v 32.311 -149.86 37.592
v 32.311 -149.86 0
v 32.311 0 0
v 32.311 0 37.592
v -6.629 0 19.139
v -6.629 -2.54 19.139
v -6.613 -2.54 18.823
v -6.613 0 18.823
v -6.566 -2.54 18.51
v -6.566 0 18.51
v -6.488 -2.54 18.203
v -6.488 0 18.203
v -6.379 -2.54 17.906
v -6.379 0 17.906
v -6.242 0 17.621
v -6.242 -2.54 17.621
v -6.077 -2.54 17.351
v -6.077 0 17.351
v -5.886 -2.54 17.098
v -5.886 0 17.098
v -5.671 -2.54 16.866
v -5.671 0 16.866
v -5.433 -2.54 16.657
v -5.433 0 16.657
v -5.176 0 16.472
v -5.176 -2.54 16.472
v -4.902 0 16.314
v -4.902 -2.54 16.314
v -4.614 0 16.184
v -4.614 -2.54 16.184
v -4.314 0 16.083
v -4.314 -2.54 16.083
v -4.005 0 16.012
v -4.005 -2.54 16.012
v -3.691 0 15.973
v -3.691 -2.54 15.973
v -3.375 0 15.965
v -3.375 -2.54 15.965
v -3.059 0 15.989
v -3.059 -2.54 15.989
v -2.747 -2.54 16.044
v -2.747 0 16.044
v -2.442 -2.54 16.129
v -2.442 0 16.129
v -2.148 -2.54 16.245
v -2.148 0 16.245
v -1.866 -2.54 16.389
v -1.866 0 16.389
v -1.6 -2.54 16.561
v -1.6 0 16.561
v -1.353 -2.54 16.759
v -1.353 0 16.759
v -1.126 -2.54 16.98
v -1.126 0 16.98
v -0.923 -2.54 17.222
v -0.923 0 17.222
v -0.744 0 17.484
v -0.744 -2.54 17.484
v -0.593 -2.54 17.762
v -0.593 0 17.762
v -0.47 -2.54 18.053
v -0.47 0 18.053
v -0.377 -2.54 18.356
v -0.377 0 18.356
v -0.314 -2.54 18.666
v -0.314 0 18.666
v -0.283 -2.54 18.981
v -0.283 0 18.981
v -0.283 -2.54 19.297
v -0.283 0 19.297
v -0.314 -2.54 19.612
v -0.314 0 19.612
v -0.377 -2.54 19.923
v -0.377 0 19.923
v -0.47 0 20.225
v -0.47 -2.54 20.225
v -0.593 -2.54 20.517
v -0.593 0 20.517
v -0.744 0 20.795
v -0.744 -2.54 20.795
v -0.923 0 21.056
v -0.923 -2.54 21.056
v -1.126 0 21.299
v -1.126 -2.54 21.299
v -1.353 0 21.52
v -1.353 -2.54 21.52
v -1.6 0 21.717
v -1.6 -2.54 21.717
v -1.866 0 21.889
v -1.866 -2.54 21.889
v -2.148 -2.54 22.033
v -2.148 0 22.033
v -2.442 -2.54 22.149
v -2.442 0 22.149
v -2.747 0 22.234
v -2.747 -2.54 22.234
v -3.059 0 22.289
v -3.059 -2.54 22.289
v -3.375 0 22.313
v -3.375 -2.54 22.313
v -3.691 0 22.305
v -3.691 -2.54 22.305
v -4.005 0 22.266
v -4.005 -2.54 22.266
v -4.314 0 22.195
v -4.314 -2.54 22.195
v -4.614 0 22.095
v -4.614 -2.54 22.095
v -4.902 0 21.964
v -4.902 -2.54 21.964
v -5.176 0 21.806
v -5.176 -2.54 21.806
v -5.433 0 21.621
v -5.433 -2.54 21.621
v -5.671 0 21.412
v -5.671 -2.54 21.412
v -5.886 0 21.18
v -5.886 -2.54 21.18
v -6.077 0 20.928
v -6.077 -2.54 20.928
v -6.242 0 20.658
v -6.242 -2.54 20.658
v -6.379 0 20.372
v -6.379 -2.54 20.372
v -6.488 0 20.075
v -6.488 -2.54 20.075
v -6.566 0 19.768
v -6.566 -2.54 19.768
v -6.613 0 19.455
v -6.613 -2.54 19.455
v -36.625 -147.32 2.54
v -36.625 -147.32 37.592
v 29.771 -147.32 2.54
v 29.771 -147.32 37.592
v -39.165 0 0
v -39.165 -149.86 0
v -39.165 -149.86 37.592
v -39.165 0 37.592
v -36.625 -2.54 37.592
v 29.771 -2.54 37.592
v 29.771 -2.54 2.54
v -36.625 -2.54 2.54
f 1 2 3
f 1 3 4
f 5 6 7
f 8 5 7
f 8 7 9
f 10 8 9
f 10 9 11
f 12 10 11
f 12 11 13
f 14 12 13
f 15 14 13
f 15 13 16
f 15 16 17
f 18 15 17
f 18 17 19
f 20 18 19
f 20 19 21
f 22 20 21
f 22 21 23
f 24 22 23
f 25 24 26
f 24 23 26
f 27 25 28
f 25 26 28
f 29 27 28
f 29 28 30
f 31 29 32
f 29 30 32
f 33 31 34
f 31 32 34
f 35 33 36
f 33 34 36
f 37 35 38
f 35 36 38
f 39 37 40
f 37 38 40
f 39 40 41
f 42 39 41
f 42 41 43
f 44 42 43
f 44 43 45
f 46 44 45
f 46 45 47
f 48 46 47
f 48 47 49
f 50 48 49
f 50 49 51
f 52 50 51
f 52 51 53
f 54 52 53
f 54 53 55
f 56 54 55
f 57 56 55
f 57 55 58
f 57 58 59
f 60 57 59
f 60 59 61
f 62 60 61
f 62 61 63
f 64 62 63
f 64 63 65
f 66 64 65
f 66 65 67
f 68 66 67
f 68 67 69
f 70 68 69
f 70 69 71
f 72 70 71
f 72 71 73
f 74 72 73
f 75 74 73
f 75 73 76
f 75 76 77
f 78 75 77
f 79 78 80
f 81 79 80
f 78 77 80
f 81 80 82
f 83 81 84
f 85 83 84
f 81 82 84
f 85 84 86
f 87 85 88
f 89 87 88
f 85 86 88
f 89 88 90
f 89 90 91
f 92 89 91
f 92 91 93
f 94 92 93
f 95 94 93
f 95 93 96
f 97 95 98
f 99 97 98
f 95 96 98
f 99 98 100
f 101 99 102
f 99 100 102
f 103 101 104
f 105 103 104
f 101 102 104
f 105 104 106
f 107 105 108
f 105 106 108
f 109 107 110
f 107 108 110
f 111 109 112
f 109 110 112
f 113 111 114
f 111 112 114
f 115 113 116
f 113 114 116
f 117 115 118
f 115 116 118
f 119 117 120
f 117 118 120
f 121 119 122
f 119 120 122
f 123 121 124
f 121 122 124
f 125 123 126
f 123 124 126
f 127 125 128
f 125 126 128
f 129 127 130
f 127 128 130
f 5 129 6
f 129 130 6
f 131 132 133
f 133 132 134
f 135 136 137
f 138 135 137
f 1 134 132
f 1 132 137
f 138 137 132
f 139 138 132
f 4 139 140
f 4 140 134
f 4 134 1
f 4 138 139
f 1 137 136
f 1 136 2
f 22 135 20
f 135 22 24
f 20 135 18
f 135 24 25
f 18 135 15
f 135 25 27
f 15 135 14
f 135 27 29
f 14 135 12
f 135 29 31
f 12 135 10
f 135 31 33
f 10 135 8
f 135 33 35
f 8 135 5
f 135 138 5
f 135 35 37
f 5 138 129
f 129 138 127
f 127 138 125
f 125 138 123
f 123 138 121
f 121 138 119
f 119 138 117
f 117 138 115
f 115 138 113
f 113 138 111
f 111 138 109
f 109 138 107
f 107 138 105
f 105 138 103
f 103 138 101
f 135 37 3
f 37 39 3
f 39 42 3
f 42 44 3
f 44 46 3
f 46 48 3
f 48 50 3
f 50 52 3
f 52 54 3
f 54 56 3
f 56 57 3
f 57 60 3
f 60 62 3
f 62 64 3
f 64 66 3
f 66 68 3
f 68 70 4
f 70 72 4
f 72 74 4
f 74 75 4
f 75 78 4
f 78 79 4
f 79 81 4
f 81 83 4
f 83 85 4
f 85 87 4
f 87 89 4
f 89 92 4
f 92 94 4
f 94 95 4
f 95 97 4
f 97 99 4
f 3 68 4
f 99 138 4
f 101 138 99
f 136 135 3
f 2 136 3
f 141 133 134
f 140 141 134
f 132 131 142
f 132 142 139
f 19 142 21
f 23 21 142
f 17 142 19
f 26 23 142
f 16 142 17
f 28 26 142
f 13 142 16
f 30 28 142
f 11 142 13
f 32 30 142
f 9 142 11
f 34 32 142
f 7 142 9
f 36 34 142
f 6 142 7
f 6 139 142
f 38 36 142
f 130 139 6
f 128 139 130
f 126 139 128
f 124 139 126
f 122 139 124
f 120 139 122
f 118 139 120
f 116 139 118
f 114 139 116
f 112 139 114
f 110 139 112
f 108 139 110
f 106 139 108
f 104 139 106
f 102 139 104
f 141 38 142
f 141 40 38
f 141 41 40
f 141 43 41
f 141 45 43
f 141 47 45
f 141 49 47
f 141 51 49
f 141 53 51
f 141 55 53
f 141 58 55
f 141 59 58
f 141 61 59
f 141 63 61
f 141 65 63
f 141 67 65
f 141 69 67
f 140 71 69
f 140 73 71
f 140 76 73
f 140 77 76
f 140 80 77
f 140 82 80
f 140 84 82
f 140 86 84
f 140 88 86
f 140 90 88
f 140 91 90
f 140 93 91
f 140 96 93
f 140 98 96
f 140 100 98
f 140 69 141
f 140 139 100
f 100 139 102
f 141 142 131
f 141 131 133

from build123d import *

# Parameters (mm, degrees)
F0_W     = 71.4756
F0_H     = 37.592
F1_DEPTH = 149.86
F2_T     = -2.54
F4_D     = 6.35
F4_DEPTH = 25.4
F4_TIP   = 1.9077324654


with BuildPart() as f1:
    # F0 (on Front) → F1 (new body)
    with BuildSketch(Plane.XZ):
        with Locations((-3.4269116563, 18.796)):
            Rectangle(F0_W, F0_H)
    extrude(amount=F1_DEPTH)

    # F2
    f2_openings = [f1.faces().sort_by_distance(p)[0] for p in [
        (-3.426912, -74.93, 37.592),
    ]]
    offset(amount=F2_T, openings=f2_openings)

    # F4
    with Locations(Plane(origin=(0, 0, 0), x_dir=(1, 0, 0), z_dir=(0, 1, 0))):
        with Locations((-3.4536644816, -19.1390831023)):
            Hole(F4_D / 2, depth=F4_DEPTH)
            with Locations((0, 0, -(F4_DEPTH + F4_TIP / 2))):  # 118° drill point
                Cone(0, F4_D / 2, F4_TIP, mode=Mode.SUBTRACT)


solid = f1.part
